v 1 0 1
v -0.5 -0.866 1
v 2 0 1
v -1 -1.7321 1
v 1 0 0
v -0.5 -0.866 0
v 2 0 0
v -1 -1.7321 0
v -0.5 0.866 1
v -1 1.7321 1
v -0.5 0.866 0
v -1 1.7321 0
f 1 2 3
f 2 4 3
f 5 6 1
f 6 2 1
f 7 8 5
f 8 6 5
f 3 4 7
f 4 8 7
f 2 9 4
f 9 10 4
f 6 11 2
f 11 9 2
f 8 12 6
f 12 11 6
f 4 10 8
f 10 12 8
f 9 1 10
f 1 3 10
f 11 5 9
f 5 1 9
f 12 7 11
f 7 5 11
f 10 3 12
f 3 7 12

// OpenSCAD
rotate_extrude(angle=360, $fn=3) translate([-2,0]) square([1,1]);
